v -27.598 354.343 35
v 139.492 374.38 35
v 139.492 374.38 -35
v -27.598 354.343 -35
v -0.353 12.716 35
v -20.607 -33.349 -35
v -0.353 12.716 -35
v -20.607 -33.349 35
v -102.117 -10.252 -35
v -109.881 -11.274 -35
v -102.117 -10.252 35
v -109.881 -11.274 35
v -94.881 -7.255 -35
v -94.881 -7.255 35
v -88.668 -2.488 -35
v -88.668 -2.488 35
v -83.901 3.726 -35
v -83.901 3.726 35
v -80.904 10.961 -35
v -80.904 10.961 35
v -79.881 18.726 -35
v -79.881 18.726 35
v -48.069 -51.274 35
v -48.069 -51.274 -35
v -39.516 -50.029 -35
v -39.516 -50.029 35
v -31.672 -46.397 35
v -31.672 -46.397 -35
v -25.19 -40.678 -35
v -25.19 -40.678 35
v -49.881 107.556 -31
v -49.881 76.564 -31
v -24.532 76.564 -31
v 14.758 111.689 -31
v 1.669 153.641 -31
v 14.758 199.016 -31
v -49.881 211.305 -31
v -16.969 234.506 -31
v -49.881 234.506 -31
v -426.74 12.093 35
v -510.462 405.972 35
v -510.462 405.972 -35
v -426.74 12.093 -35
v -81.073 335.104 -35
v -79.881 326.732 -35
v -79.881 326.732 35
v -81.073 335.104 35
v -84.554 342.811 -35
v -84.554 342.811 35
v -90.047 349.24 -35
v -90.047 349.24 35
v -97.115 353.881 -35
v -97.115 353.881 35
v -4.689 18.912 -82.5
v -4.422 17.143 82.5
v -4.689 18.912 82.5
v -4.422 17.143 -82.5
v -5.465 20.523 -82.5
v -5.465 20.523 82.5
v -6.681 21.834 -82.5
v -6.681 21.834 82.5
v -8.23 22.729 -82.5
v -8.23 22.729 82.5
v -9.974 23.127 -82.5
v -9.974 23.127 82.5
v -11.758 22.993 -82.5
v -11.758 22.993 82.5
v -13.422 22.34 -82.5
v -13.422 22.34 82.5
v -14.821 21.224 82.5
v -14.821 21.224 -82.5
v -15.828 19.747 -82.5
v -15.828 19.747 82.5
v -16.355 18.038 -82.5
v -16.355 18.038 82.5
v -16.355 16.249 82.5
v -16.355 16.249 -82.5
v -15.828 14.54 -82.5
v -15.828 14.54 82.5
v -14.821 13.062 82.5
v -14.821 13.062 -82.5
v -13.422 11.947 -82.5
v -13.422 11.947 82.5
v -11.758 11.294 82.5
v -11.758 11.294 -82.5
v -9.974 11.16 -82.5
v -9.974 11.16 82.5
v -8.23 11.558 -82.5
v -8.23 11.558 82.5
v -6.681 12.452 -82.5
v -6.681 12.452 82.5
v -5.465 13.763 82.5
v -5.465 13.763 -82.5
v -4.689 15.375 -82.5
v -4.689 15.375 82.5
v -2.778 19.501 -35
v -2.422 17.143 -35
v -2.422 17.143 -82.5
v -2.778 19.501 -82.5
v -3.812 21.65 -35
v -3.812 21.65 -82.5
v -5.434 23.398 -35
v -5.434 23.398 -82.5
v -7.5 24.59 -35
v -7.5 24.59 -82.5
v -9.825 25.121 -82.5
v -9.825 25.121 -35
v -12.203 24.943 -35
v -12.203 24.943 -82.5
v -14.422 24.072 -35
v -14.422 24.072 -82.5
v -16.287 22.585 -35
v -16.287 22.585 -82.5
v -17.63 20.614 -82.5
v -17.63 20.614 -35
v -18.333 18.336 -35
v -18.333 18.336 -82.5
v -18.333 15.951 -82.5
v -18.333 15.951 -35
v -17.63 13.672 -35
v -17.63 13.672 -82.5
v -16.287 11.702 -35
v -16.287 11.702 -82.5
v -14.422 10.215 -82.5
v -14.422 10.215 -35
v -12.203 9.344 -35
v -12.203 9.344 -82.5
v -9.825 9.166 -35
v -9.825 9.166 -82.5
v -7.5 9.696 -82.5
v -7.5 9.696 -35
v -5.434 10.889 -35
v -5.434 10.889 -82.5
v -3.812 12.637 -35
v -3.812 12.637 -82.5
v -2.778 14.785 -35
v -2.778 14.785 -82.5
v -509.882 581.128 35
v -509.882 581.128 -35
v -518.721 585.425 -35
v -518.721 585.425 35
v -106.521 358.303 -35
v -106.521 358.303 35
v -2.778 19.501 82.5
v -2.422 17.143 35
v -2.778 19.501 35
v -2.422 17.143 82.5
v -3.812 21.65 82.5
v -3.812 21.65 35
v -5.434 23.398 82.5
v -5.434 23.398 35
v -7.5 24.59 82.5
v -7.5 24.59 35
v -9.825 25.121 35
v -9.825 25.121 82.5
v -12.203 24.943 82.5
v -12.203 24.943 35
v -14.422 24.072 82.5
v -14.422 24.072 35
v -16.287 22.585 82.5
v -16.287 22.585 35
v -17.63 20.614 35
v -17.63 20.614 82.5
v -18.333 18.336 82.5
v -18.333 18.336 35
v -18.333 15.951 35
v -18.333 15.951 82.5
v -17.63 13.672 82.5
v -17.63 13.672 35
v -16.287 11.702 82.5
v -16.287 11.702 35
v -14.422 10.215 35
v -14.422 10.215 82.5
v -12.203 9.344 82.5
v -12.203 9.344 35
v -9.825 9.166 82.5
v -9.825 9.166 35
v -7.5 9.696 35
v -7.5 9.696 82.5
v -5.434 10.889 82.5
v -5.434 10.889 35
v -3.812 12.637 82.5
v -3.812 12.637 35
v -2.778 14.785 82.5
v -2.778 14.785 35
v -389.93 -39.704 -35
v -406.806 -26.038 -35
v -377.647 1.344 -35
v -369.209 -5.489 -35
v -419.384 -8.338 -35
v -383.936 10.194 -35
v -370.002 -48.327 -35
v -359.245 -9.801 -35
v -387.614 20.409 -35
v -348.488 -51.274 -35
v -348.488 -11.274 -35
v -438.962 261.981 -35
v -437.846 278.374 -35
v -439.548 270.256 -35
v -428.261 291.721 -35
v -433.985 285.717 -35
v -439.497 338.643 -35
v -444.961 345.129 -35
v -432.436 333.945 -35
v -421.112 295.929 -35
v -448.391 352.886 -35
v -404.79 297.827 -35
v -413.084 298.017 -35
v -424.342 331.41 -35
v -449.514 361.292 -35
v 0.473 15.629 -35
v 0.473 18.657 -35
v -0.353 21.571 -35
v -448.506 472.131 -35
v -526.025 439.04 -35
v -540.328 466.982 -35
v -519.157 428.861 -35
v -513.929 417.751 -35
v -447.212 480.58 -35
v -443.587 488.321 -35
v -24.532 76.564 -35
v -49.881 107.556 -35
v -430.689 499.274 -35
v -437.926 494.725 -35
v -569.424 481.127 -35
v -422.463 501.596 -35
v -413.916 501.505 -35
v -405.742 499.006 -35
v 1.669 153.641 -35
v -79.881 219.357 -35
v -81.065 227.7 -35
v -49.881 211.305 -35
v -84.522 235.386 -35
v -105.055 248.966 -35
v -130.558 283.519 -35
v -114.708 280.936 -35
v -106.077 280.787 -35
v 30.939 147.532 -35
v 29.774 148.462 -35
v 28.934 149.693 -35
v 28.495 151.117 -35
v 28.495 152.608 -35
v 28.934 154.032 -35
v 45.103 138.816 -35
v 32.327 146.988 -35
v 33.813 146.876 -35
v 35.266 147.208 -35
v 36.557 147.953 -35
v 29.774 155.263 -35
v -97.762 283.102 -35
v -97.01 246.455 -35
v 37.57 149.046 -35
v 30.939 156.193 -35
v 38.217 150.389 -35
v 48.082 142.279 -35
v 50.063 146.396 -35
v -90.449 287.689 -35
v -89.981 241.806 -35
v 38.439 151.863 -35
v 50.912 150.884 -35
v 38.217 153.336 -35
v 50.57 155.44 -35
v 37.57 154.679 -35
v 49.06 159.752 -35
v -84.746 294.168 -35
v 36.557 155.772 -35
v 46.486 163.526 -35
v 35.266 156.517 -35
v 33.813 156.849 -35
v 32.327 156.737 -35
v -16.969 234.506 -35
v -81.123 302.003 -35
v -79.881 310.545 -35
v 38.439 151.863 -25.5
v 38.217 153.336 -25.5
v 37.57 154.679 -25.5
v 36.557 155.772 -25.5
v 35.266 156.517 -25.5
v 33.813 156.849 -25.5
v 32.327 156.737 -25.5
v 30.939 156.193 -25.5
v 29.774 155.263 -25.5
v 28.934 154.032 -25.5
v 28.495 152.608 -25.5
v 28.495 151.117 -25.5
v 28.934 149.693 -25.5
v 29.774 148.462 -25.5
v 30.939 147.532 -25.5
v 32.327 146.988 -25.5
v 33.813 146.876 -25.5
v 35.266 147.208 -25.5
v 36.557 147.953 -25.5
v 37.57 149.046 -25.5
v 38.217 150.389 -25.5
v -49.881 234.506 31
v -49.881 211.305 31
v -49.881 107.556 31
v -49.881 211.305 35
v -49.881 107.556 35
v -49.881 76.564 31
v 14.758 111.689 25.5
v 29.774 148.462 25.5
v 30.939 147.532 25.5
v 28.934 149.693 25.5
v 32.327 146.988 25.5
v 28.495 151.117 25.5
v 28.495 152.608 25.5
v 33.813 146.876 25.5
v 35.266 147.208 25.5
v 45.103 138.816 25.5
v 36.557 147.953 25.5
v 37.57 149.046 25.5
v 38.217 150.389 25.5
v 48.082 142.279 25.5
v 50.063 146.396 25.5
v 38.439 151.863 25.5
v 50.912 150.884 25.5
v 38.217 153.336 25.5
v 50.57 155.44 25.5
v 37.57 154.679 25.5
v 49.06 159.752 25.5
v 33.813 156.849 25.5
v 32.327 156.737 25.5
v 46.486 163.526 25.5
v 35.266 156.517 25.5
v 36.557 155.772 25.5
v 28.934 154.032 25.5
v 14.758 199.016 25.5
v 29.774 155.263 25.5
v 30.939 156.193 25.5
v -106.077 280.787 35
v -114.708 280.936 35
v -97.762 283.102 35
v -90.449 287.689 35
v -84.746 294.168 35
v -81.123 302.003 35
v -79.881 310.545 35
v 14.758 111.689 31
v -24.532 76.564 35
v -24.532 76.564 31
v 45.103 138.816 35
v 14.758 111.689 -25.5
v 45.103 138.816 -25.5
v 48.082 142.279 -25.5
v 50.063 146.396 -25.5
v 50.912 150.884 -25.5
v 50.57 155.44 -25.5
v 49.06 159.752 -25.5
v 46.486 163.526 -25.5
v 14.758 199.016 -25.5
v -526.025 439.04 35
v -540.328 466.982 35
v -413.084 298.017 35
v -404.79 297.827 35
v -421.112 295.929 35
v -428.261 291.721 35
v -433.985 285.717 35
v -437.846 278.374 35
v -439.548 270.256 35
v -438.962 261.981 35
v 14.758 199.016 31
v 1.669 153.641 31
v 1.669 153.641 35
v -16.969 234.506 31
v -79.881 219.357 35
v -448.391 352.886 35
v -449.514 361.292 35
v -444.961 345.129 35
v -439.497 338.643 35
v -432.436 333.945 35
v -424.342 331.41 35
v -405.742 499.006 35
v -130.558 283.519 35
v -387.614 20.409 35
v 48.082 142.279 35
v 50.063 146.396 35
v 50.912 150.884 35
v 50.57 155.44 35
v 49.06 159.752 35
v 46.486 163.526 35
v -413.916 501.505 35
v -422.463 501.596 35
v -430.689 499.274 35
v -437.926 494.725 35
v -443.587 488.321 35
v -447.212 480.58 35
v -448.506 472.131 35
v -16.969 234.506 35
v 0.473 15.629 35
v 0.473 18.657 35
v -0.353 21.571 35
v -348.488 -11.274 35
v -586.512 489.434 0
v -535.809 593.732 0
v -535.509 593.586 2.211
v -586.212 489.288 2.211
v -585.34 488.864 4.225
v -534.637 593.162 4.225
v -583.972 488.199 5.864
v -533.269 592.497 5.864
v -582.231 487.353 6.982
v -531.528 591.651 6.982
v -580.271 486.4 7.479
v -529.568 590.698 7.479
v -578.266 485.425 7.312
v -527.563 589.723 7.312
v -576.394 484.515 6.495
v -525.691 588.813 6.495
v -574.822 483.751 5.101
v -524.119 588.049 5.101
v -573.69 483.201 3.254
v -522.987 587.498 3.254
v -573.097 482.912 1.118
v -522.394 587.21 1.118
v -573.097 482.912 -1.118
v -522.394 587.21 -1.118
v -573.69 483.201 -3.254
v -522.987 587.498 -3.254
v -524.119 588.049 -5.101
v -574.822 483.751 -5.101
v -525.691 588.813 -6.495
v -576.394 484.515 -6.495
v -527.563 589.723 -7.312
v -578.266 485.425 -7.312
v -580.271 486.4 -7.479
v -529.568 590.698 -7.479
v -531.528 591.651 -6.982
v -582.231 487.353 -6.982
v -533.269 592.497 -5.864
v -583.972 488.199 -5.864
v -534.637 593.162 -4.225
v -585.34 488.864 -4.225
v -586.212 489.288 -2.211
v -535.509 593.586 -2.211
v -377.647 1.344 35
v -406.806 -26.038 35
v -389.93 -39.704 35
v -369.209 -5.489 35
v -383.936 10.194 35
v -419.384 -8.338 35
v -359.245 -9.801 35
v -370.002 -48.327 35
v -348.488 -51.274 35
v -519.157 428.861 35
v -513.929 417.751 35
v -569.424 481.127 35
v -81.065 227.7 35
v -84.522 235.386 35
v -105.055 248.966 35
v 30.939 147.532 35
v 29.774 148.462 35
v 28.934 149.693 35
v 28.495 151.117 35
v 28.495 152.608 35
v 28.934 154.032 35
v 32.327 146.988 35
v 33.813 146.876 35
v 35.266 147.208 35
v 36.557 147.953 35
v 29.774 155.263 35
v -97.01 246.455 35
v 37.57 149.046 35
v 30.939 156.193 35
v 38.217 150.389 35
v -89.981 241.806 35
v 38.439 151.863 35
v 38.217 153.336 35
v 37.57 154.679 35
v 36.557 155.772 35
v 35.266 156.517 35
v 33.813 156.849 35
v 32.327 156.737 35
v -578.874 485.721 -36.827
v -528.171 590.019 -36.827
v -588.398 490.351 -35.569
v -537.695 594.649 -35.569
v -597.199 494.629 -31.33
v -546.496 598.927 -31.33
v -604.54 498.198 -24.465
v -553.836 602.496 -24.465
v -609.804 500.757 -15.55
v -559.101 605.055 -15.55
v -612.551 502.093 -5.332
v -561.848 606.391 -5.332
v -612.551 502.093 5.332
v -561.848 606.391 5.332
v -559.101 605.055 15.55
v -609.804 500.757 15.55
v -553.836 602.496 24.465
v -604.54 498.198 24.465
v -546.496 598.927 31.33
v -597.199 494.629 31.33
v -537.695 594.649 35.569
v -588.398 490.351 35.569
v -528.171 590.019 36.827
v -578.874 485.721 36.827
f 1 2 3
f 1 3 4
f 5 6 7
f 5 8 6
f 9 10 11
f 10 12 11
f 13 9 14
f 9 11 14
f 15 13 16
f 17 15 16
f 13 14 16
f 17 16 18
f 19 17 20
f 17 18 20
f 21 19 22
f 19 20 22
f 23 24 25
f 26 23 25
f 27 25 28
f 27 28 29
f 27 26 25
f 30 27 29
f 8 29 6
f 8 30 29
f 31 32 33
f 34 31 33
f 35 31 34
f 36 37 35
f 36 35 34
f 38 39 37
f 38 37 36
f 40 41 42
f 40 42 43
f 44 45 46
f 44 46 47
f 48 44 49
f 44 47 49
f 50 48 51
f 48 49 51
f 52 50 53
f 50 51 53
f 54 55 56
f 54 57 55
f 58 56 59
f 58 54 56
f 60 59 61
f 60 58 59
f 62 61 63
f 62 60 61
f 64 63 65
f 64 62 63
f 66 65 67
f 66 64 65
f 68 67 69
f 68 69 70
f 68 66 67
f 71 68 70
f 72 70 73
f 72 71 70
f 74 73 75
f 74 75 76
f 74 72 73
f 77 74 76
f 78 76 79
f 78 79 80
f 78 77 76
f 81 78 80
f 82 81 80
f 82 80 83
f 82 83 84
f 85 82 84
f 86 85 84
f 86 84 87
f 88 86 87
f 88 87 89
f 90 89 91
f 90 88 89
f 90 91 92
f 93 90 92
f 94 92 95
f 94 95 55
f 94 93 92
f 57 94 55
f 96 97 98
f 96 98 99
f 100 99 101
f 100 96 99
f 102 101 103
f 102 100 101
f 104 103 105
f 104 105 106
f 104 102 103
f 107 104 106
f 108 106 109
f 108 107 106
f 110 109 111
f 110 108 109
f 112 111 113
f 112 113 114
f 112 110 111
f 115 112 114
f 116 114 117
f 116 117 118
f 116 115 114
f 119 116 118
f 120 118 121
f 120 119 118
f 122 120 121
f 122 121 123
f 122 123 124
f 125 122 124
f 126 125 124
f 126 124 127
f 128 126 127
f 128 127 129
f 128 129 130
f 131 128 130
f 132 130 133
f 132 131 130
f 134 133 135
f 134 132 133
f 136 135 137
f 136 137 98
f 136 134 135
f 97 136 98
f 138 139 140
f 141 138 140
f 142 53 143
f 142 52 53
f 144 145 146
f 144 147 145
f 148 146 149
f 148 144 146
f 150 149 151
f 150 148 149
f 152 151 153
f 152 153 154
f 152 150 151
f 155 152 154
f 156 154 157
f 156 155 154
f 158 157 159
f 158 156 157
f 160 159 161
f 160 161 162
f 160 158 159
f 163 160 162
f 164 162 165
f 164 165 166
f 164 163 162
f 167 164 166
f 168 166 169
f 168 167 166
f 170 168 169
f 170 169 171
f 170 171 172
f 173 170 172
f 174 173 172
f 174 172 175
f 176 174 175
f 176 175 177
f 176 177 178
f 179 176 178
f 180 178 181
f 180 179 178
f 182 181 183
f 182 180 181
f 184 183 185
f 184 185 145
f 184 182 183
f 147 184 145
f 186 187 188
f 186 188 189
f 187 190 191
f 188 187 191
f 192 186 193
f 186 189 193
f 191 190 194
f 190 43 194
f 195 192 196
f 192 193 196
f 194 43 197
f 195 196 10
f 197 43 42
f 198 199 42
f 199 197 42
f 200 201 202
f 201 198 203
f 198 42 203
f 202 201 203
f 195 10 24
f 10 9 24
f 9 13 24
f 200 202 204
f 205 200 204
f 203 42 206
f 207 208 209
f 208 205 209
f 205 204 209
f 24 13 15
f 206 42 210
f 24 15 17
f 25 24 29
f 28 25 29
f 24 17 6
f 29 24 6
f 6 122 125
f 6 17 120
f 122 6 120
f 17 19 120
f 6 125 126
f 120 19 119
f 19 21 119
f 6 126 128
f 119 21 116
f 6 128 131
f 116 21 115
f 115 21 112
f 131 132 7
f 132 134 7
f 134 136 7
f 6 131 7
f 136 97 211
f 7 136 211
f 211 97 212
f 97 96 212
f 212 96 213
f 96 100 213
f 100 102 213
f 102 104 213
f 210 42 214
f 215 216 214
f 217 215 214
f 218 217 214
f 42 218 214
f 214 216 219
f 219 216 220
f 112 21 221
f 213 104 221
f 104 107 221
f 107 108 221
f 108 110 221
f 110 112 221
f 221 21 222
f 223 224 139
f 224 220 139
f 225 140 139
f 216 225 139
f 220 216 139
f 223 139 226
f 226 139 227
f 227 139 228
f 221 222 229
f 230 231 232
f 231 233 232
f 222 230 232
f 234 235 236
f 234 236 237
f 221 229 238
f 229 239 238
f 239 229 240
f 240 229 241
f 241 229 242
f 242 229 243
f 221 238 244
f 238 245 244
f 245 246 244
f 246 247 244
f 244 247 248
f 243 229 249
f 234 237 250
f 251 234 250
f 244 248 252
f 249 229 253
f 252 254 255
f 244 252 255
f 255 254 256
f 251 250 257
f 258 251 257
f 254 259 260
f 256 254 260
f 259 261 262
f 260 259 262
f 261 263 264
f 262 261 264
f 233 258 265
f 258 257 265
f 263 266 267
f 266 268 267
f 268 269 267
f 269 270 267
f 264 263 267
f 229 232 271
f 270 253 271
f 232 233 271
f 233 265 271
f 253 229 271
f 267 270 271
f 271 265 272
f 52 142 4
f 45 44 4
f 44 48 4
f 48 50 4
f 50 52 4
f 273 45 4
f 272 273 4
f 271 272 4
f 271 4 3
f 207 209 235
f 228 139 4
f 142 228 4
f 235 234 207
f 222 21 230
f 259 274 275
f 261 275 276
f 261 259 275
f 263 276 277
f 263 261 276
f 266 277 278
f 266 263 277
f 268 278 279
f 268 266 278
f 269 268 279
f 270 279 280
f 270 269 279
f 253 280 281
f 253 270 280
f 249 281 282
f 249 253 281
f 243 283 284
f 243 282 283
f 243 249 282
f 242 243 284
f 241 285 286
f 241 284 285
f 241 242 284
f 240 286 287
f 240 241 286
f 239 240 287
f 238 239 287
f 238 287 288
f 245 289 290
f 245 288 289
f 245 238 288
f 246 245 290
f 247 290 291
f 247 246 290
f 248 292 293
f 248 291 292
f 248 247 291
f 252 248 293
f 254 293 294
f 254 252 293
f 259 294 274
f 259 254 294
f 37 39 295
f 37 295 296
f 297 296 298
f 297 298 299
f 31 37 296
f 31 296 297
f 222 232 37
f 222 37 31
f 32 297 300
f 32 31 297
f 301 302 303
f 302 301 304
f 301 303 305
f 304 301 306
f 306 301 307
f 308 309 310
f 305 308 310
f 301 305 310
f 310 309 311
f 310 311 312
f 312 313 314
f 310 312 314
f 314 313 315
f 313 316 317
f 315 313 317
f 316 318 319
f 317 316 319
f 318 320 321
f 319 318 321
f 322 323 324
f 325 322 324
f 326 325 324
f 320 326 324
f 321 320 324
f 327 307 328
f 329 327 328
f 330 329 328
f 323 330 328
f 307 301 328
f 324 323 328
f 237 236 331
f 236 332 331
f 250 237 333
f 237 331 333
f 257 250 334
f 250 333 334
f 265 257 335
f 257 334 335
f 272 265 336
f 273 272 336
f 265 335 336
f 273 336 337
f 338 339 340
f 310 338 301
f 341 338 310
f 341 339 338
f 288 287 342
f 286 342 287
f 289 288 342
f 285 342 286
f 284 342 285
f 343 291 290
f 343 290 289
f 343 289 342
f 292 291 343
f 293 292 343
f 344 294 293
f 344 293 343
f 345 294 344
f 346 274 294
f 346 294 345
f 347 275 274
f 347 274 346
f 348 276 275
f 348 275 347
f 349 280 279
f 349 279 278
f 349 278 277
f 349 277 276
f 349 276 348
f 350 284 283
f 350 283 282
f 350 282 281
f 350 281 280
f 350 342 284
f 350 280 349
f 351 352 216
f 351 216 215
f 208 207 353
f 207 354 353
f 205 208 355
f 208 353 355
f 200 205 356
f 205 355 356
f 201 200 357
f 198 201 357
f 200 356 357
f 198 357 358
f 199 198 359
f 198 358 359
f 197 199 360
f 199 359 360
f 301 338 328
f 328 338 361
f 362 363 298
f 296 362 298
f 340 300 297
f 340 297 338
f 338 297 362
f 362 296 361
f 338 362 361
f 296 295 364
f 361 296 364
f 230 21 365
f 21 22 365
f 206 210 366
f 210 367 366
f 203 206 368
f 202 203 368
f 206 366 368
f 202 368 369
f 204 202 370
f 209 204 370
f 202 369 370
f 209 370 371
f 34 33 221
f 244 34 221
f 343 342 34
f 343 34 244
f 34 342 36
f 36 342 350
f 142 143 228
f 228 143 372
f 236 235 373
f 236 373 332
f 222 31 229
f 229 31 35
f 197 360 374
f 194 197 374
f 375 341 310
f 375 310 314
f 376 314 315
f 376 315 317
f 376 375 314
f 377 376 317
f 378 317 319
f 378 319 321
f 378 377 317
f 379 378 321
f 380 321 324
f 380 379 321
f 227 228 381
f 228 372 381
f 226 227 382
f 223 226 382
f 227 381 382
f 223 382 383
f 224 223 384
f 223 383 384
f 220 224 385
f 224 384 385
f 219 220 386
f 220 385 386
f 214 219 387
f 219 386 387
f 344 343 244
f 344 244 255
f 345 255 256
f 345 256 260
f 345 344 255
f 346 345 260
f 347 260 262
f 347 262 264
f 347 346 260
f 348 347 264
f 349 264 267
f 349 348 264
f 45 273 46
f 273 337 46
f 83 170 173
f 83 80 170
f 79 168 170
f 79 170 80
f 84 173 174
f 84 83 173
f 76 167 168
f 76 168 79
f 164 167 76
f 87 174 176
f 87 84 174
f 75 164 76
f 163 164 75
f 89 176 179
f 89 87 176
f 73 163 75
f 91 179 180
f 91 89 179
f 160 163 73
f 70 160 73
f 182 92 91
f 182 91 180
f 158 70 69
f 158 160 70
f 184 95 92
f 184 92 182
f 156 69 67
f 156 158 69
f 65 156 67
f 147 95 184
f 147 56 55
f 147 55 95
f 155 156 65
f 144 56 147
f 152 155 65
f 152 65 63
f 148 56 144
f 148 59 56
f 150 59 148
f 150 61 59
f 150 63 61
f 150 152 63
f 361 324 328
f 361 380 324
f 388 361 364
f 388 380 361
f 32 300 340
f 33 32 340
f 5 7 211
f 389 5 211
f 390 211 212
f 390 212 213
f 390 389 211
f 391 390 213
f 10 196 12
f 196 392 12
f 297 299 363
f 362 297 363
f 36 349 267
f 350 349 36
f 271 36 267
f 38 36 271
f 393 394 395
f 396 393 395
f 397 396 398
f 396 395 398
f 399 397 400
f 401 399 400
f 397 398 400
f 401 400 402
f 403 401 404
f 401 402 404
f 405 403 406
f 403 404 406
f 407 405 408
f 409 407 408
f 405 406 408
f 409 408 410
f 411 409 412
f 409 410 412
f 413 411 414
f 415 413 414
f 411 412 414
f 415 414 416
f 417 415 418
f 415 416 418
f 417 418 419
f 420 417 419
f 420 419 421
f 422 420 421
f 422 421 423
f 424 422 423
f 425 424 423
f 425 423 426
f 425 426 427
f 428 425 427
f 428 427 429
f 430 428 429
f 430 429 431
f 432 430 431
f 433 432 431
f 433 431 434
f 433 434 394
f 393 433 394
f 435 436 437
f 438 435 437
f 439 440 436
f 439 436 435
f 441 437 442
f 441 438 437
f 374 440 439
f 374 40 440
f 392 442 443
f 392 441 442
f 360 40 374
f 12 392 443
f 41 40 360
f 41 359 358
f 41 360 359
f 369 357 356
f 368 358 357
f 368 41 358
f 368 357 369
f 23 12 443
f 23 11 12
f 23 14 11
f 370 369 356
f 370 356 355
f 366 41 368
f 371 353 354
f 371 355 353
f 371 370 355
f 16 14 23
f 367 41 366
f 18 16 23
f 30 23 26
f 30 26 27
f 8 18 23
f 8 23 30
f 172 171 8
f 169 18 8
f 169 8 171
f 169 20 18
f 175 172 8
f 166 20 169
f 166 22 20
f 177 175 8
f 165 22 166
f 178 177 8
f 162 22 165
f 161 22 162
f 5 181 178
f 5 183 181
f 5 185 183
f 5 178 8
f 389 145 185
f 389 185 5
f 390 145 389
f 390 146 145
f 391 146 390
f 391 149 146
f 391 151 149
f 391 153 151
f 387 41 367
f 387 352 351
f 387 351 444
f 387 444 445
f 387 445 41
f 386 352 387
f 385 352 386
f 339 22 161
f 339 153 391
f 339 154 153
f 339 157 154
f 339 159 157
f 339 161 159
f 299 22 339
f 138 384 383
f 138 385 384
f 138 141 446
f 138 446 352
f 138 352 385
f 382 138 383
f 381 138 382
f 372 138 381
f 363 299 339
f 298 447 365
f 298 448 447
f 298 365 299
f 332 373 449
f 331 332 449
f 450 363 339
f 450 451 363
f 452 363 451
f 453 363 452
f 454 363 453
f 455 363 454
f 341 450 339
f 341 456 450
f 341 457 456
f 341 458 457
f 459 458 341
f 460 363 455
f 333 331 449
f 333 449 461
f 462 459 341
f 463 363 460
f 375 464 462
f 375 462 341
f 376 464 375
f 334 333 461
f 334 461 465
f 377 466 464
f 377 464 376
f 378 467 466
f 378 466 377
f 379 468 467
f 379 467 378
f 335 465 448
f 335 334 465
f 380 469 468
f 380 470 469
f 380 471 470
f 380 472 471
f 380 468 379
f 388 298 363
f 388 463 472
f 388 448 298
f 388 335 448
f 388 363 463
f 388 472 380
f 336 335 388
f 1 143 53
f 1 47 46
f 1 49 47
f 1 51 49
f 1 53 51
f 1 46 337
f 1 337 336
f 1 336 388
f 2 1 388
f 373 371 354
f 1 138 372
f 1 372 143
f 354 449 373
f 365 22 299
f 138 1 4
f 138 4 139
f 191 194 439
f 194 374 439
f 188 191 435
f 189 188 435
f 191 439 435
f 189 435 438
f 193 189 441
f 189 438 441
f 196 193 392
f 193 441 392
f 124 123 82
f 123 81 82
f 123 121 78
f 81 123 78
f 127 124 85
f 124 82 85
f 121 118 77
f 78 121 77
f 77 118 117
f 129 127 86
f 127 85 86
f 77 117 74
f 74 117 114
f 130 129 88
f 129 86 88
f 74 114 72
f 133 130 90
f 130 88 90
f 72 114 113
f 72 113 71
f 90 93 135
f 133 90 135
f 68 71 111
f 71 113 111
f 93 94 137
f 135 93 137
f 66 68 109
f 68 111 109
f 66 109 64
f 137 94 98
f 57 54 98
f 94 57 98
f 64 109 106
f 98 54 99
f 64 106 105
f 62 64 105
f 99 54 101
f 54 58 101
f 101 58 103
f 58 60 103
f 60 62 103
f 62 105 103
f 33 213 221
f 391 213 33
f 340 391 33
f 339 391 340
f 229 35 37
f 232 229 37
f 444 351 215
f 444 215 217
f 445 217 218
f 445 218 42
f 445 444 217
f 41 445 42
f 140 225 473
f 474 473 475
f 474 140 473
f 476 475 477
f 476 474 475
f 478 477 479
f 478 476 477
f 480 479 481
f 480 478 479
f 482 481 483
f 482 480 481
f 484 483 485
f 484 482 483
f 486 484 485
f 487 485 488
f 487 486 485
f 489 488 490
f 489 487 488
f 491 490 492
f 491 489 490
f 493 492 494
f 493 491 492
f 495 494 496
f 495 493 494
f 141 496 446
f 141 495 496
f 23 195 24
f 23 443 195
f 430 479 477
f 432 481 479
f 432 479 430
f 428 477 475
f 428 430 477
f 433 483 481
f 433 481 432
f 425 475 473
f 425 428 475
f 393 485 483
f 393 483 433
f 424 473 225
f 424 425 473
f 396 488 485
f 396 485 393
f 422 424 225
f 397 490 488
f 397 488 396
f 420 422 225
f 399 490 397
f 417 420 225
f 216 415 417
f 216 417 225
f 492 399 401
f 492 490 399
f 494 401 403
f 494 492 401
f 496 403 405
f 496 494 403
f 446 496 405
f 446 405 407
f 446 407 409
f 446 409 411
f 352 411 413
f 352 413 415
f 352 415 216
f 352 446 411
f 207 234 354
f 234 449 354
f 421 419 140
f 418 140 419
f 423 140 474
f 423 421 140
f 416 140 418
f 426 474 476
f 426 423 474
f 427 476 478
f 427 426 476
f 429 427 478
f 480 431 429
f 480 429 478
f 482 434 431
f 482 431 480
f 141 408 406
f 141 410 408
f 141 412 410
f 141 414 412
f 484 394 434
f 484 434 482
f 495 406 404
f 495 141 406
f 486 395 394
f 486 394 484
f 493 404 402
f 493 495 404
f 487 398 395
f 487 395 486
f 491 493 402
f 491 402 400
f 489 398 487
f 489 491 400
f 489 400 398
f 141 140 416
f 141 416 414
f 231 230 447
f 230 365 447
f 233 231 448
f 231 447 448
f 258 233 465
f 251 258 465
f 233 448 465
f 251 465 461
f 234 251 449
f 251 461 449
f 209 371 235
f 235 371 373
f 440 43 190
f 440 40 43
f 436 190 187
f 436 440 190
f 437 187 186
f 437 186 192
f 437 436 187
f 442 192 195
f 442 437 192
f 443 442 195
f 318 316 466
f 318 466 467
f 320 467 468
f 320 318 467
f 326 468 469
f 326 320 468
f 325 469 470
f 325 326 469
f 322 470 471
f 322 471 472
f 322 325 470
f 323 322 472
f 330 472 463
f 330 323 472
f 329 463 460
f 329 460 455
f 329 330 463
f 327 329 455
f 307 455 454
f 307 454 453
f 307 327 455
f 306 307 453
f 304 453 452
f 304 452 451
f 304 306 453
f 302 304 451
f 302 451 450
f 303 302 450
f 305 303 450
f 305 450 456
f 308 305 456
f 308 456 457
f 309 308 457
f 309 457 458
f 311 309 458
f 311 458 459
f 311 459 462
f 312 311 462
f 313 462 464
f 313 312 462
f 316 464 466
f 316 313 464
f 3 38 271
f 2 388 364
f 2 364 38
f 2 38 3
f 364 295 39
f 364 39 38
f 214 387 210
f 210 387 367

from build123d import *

# Parameters (mm, degrees)
SKETCH_1_R          = 5
SKETCH_1_R_2        = 8
EXTRUDE_1_DEPTH     = 35
SKETCH_2_R          = 8
SKETCH_2_R_2        = 6
EXTRUDE_2_DEPTH     = 82.5
SKETCH_3_W          = 42.302016602
SKETCH_3_H          = 114.861822868
CUT_EXTRUDE_1_DEPTH = 25.5
SKETCH_4_W          = 64.639494707
SKETCH_4_H          = 157.942491396
CUT_EXTRUDE_2_DEPTH = 31
SKETCH_5_R          = 36.84087404
SKETCH_5_R_2        = 7.5
EXTRUDE_3_DEPTH     = 128.2
CUT_EXTRUDE_3_DEPTH = 64


with BuildPart() as part:
    # Эскиз1 → Бобышка-Вытянуть1 (new, symmetric)
    with BuildSketch(Plane.XY):
        with BuildLine():
            Line((46.485752599, 163.525957525), (-16.969355429, 234.506193035))
            Line((-16.969355429, 234.506193035), (139.491938283, 374.379894827))
            Line((139.491938283, 374.379894827), (-27.598469683, 354.342788957))
            Line((-27.598469683, 354.342788957), (-509.881731069, 581.127761724))
            Line((-509.881731069, 581.127761724), (-518.721104493, 585.424916142))
            Line((-518.721104493, 585.424916142), (-574.35237116, 470.989759218))
            Line((-574.35237116, 470.989759218), (-563.968249487, 466.106813988))
            Line((-563.968249487, 466.106813988), (-554.670789116, 461.734851563))
            ThreePointArc((-554.670789116, 461.734851563), (-526.024716524, 439.039773197), (-510.461622358, 405.972354837))
            Line((-510.461622358, 405.972354837), (-426.739911846, 12.092674745))
            ThreePointArc((-426.739911846, 12.092674745), (-398.833735071, -33.446066906), (-348.488103787, -51.27438999))
            Line((-348.488103787, -51.27438999), (-48.06941217, -51.27438999))
            ThreePointArc((-48.06941217, -51.27438999), (-31.671926194, -46.396540648), (-20.606737964, -33.349220236))
            Line((-20.606737964, -33.349220236), (-0.352735385, 12.715946965))
            ThreePointArc((-0.352735385, 12.715946965), (0.577617407, 17.143384722), (-0.352735385, 21.570822479))
            Line((-0.352735385, 21.570822479), (-24.532087898, 76.563701639))
            Line((-24.532087898, 76.563701639), (45.102587172, 138.81590181))
            ThreePointArc((45.102587172, 138.81590181), (50.911789988, 150.884466728), (46.485752599, 163.525957525))
        make_face()
        with Locations((33.439142029, 151.862512381)):
            Circle(SKETCH_1_R, mode=Mode.SUBTRACT)
        with Locations((-10.422382593, 17.143384722)):
            Circle(SKETCH_1_R_2, mode=Mode.SUBTRACT)
        Polygon((1.669070396, 153.64086793), (-49.881296122, 211.304581219), (-49.881296122, 107.555728133), align=None, mode=Mode.SUBTRACT)
        with BuildLine():
            Line((-424.341826107, 331.410461473), (-130.558293442, 283.519373673))
            Line((-130.558293442, 283.519373673), (-114.7080306, 280.935544953))
            ThreePointArc((-114.7080306, 280.935544953), (-90.449389812, 287.688615998), (-79.881296122, 310.544709653))
            Line((-79.881296122, 310.544709653), (-79.881296122, 326.732272667))
            ThreePointArc((-79.881296122, 326.732272667), (-84.553646066, 342.810523277), (-97.115305634, 353.880559664))
            Line((-97.115305634, 353.880559664), (-106.521117185, 358.30347227))
            Line((-106.521117185, 358.30347227), (-405.741591683, 499.006483537))
            ThreePointArc((-405.741591683, 499.006483537), (-434.47055763, 497.258657451), (-448.506342859, 472.130881716))
            Line((-448.506342859, 472.130881716), (-449.513852316, 361.29231135))
            ThreePointArc((-449.513852316, 361.29231135), (-442.459263359, 341.691796922), (-424.341826107, 331.410461473))
        make_face(mode=Mode.SUBTRACT)
        with BuildLine():
            Line((-438.961647095, 261.980792175), (-387.614007817, 20.409142377))
            ThreePointArc((-387.614007817, 20.409142377), (-373.660919429, -2.360228448), (-348.488103787, -11.27438999))
            Line((-348.488103787, -11.27438999), (-109.881296122, -11.27438999))
            ThreePointArc((-109.881296122, -11.27438999), (-88.668092686, -2.487593425), (-79.881296122, 18.72561001))
            Line((-79.881296122, 18.72561001), (-79.881296122, 219.356726902))
            ThreePointArc((-79.881296122, 219.356726902), (-87.025202466, 238.788633212), (-105.054561643, 248.965891603))
            Line((-105.054561643, 248.965891603), (-404.790484594, 297.8273076))
            ThreePointArc((-404.790484594, 297.8273076), (-431.331787712, 288.917841178), (-438.961647095, 261.980792175))
        make_face(mode=Mode.SUBTRACT)
    extrude(amount=EXTRUDE_1_DEPTH, both=True)

    # Эскиз2 → Бобышка-Вытянуть2 (add, symmetric)
    with BuildSketch(Plane.XY):
        with Locations((-10.422382593, 17.143384722)):
            Circle(SKETCH_2_R)
        with Locations((-10.422382593, 17.143384722)):
            Circle(SKETCH_2_R_2, mode=Mode.SUBTRACT)
    extrude(amount=EXTRUDE_2_DEPTH, both=True)

    # Эскиз3 → Вырез-Вытянуть1 (cut, symmetric)
    with BuildSketch(Plane.XY):
        with Locations((35.909206886, 152.283379398)):
            Rectangle(SKETCH_3_W, SKETCH_3_H)
    extrude(amount=CUT_EXTRUDE_1_DEPTH, both=True, mode=Mode.SUBTRACT)

    # Эскиз4 → Вырез-Вытянуть2 (cut, symmetric)
    with BuildSketch(Plane.XY):
        with Locations((-17.561548768, 155.534947337)):
            Rectangle(SKETCH_4_W, SKETCH_4_H)
    extrude(amount=CUT_EXTRUDE_2_DEPTH, both=True, mode=Mode.SUBTRACT)

    # Эскиз5 → Бобышка-Вытянуть3 (add)
    with BuildSketch(Plane(origin=(131.039320596, 269.551748755, 0), x_dir=(0.8993583813402204, -0.4372121932347024, 0), z_dir=(0.4372121932347024, 0.8993583813402204, 0))):
        with Locations(Location((-733.971084464, 0, 0), (0, 0, 180))):
            Circle(SKETCH_5_R)
        with Locations(Location((-733.971084464, 0, 0), (0, 0, 180))):
            Circle(SKETCH_5_R_2, mode=Mode.SUBTRACT)
    extrude(amount=-EXTRUDE_3_DEPTH)

    # Эскиз6 → Вырез-Вытянуть3 (cut, symmetric)
    with BuildSketch(Plane.XY):
        Polygon((-612.900055289, 502.26219729), (-540.3281869, 466.982261723), (-526.024716524, 439.039773197), (-623.276117578, 486.317364902), (-615.524730273, 502.26219729), align=None)
    extrude(amount=CUT_EXTRUDE_3_DEPTH, both=True, mode=Mode.SUBTRACT)


solid = part.part
